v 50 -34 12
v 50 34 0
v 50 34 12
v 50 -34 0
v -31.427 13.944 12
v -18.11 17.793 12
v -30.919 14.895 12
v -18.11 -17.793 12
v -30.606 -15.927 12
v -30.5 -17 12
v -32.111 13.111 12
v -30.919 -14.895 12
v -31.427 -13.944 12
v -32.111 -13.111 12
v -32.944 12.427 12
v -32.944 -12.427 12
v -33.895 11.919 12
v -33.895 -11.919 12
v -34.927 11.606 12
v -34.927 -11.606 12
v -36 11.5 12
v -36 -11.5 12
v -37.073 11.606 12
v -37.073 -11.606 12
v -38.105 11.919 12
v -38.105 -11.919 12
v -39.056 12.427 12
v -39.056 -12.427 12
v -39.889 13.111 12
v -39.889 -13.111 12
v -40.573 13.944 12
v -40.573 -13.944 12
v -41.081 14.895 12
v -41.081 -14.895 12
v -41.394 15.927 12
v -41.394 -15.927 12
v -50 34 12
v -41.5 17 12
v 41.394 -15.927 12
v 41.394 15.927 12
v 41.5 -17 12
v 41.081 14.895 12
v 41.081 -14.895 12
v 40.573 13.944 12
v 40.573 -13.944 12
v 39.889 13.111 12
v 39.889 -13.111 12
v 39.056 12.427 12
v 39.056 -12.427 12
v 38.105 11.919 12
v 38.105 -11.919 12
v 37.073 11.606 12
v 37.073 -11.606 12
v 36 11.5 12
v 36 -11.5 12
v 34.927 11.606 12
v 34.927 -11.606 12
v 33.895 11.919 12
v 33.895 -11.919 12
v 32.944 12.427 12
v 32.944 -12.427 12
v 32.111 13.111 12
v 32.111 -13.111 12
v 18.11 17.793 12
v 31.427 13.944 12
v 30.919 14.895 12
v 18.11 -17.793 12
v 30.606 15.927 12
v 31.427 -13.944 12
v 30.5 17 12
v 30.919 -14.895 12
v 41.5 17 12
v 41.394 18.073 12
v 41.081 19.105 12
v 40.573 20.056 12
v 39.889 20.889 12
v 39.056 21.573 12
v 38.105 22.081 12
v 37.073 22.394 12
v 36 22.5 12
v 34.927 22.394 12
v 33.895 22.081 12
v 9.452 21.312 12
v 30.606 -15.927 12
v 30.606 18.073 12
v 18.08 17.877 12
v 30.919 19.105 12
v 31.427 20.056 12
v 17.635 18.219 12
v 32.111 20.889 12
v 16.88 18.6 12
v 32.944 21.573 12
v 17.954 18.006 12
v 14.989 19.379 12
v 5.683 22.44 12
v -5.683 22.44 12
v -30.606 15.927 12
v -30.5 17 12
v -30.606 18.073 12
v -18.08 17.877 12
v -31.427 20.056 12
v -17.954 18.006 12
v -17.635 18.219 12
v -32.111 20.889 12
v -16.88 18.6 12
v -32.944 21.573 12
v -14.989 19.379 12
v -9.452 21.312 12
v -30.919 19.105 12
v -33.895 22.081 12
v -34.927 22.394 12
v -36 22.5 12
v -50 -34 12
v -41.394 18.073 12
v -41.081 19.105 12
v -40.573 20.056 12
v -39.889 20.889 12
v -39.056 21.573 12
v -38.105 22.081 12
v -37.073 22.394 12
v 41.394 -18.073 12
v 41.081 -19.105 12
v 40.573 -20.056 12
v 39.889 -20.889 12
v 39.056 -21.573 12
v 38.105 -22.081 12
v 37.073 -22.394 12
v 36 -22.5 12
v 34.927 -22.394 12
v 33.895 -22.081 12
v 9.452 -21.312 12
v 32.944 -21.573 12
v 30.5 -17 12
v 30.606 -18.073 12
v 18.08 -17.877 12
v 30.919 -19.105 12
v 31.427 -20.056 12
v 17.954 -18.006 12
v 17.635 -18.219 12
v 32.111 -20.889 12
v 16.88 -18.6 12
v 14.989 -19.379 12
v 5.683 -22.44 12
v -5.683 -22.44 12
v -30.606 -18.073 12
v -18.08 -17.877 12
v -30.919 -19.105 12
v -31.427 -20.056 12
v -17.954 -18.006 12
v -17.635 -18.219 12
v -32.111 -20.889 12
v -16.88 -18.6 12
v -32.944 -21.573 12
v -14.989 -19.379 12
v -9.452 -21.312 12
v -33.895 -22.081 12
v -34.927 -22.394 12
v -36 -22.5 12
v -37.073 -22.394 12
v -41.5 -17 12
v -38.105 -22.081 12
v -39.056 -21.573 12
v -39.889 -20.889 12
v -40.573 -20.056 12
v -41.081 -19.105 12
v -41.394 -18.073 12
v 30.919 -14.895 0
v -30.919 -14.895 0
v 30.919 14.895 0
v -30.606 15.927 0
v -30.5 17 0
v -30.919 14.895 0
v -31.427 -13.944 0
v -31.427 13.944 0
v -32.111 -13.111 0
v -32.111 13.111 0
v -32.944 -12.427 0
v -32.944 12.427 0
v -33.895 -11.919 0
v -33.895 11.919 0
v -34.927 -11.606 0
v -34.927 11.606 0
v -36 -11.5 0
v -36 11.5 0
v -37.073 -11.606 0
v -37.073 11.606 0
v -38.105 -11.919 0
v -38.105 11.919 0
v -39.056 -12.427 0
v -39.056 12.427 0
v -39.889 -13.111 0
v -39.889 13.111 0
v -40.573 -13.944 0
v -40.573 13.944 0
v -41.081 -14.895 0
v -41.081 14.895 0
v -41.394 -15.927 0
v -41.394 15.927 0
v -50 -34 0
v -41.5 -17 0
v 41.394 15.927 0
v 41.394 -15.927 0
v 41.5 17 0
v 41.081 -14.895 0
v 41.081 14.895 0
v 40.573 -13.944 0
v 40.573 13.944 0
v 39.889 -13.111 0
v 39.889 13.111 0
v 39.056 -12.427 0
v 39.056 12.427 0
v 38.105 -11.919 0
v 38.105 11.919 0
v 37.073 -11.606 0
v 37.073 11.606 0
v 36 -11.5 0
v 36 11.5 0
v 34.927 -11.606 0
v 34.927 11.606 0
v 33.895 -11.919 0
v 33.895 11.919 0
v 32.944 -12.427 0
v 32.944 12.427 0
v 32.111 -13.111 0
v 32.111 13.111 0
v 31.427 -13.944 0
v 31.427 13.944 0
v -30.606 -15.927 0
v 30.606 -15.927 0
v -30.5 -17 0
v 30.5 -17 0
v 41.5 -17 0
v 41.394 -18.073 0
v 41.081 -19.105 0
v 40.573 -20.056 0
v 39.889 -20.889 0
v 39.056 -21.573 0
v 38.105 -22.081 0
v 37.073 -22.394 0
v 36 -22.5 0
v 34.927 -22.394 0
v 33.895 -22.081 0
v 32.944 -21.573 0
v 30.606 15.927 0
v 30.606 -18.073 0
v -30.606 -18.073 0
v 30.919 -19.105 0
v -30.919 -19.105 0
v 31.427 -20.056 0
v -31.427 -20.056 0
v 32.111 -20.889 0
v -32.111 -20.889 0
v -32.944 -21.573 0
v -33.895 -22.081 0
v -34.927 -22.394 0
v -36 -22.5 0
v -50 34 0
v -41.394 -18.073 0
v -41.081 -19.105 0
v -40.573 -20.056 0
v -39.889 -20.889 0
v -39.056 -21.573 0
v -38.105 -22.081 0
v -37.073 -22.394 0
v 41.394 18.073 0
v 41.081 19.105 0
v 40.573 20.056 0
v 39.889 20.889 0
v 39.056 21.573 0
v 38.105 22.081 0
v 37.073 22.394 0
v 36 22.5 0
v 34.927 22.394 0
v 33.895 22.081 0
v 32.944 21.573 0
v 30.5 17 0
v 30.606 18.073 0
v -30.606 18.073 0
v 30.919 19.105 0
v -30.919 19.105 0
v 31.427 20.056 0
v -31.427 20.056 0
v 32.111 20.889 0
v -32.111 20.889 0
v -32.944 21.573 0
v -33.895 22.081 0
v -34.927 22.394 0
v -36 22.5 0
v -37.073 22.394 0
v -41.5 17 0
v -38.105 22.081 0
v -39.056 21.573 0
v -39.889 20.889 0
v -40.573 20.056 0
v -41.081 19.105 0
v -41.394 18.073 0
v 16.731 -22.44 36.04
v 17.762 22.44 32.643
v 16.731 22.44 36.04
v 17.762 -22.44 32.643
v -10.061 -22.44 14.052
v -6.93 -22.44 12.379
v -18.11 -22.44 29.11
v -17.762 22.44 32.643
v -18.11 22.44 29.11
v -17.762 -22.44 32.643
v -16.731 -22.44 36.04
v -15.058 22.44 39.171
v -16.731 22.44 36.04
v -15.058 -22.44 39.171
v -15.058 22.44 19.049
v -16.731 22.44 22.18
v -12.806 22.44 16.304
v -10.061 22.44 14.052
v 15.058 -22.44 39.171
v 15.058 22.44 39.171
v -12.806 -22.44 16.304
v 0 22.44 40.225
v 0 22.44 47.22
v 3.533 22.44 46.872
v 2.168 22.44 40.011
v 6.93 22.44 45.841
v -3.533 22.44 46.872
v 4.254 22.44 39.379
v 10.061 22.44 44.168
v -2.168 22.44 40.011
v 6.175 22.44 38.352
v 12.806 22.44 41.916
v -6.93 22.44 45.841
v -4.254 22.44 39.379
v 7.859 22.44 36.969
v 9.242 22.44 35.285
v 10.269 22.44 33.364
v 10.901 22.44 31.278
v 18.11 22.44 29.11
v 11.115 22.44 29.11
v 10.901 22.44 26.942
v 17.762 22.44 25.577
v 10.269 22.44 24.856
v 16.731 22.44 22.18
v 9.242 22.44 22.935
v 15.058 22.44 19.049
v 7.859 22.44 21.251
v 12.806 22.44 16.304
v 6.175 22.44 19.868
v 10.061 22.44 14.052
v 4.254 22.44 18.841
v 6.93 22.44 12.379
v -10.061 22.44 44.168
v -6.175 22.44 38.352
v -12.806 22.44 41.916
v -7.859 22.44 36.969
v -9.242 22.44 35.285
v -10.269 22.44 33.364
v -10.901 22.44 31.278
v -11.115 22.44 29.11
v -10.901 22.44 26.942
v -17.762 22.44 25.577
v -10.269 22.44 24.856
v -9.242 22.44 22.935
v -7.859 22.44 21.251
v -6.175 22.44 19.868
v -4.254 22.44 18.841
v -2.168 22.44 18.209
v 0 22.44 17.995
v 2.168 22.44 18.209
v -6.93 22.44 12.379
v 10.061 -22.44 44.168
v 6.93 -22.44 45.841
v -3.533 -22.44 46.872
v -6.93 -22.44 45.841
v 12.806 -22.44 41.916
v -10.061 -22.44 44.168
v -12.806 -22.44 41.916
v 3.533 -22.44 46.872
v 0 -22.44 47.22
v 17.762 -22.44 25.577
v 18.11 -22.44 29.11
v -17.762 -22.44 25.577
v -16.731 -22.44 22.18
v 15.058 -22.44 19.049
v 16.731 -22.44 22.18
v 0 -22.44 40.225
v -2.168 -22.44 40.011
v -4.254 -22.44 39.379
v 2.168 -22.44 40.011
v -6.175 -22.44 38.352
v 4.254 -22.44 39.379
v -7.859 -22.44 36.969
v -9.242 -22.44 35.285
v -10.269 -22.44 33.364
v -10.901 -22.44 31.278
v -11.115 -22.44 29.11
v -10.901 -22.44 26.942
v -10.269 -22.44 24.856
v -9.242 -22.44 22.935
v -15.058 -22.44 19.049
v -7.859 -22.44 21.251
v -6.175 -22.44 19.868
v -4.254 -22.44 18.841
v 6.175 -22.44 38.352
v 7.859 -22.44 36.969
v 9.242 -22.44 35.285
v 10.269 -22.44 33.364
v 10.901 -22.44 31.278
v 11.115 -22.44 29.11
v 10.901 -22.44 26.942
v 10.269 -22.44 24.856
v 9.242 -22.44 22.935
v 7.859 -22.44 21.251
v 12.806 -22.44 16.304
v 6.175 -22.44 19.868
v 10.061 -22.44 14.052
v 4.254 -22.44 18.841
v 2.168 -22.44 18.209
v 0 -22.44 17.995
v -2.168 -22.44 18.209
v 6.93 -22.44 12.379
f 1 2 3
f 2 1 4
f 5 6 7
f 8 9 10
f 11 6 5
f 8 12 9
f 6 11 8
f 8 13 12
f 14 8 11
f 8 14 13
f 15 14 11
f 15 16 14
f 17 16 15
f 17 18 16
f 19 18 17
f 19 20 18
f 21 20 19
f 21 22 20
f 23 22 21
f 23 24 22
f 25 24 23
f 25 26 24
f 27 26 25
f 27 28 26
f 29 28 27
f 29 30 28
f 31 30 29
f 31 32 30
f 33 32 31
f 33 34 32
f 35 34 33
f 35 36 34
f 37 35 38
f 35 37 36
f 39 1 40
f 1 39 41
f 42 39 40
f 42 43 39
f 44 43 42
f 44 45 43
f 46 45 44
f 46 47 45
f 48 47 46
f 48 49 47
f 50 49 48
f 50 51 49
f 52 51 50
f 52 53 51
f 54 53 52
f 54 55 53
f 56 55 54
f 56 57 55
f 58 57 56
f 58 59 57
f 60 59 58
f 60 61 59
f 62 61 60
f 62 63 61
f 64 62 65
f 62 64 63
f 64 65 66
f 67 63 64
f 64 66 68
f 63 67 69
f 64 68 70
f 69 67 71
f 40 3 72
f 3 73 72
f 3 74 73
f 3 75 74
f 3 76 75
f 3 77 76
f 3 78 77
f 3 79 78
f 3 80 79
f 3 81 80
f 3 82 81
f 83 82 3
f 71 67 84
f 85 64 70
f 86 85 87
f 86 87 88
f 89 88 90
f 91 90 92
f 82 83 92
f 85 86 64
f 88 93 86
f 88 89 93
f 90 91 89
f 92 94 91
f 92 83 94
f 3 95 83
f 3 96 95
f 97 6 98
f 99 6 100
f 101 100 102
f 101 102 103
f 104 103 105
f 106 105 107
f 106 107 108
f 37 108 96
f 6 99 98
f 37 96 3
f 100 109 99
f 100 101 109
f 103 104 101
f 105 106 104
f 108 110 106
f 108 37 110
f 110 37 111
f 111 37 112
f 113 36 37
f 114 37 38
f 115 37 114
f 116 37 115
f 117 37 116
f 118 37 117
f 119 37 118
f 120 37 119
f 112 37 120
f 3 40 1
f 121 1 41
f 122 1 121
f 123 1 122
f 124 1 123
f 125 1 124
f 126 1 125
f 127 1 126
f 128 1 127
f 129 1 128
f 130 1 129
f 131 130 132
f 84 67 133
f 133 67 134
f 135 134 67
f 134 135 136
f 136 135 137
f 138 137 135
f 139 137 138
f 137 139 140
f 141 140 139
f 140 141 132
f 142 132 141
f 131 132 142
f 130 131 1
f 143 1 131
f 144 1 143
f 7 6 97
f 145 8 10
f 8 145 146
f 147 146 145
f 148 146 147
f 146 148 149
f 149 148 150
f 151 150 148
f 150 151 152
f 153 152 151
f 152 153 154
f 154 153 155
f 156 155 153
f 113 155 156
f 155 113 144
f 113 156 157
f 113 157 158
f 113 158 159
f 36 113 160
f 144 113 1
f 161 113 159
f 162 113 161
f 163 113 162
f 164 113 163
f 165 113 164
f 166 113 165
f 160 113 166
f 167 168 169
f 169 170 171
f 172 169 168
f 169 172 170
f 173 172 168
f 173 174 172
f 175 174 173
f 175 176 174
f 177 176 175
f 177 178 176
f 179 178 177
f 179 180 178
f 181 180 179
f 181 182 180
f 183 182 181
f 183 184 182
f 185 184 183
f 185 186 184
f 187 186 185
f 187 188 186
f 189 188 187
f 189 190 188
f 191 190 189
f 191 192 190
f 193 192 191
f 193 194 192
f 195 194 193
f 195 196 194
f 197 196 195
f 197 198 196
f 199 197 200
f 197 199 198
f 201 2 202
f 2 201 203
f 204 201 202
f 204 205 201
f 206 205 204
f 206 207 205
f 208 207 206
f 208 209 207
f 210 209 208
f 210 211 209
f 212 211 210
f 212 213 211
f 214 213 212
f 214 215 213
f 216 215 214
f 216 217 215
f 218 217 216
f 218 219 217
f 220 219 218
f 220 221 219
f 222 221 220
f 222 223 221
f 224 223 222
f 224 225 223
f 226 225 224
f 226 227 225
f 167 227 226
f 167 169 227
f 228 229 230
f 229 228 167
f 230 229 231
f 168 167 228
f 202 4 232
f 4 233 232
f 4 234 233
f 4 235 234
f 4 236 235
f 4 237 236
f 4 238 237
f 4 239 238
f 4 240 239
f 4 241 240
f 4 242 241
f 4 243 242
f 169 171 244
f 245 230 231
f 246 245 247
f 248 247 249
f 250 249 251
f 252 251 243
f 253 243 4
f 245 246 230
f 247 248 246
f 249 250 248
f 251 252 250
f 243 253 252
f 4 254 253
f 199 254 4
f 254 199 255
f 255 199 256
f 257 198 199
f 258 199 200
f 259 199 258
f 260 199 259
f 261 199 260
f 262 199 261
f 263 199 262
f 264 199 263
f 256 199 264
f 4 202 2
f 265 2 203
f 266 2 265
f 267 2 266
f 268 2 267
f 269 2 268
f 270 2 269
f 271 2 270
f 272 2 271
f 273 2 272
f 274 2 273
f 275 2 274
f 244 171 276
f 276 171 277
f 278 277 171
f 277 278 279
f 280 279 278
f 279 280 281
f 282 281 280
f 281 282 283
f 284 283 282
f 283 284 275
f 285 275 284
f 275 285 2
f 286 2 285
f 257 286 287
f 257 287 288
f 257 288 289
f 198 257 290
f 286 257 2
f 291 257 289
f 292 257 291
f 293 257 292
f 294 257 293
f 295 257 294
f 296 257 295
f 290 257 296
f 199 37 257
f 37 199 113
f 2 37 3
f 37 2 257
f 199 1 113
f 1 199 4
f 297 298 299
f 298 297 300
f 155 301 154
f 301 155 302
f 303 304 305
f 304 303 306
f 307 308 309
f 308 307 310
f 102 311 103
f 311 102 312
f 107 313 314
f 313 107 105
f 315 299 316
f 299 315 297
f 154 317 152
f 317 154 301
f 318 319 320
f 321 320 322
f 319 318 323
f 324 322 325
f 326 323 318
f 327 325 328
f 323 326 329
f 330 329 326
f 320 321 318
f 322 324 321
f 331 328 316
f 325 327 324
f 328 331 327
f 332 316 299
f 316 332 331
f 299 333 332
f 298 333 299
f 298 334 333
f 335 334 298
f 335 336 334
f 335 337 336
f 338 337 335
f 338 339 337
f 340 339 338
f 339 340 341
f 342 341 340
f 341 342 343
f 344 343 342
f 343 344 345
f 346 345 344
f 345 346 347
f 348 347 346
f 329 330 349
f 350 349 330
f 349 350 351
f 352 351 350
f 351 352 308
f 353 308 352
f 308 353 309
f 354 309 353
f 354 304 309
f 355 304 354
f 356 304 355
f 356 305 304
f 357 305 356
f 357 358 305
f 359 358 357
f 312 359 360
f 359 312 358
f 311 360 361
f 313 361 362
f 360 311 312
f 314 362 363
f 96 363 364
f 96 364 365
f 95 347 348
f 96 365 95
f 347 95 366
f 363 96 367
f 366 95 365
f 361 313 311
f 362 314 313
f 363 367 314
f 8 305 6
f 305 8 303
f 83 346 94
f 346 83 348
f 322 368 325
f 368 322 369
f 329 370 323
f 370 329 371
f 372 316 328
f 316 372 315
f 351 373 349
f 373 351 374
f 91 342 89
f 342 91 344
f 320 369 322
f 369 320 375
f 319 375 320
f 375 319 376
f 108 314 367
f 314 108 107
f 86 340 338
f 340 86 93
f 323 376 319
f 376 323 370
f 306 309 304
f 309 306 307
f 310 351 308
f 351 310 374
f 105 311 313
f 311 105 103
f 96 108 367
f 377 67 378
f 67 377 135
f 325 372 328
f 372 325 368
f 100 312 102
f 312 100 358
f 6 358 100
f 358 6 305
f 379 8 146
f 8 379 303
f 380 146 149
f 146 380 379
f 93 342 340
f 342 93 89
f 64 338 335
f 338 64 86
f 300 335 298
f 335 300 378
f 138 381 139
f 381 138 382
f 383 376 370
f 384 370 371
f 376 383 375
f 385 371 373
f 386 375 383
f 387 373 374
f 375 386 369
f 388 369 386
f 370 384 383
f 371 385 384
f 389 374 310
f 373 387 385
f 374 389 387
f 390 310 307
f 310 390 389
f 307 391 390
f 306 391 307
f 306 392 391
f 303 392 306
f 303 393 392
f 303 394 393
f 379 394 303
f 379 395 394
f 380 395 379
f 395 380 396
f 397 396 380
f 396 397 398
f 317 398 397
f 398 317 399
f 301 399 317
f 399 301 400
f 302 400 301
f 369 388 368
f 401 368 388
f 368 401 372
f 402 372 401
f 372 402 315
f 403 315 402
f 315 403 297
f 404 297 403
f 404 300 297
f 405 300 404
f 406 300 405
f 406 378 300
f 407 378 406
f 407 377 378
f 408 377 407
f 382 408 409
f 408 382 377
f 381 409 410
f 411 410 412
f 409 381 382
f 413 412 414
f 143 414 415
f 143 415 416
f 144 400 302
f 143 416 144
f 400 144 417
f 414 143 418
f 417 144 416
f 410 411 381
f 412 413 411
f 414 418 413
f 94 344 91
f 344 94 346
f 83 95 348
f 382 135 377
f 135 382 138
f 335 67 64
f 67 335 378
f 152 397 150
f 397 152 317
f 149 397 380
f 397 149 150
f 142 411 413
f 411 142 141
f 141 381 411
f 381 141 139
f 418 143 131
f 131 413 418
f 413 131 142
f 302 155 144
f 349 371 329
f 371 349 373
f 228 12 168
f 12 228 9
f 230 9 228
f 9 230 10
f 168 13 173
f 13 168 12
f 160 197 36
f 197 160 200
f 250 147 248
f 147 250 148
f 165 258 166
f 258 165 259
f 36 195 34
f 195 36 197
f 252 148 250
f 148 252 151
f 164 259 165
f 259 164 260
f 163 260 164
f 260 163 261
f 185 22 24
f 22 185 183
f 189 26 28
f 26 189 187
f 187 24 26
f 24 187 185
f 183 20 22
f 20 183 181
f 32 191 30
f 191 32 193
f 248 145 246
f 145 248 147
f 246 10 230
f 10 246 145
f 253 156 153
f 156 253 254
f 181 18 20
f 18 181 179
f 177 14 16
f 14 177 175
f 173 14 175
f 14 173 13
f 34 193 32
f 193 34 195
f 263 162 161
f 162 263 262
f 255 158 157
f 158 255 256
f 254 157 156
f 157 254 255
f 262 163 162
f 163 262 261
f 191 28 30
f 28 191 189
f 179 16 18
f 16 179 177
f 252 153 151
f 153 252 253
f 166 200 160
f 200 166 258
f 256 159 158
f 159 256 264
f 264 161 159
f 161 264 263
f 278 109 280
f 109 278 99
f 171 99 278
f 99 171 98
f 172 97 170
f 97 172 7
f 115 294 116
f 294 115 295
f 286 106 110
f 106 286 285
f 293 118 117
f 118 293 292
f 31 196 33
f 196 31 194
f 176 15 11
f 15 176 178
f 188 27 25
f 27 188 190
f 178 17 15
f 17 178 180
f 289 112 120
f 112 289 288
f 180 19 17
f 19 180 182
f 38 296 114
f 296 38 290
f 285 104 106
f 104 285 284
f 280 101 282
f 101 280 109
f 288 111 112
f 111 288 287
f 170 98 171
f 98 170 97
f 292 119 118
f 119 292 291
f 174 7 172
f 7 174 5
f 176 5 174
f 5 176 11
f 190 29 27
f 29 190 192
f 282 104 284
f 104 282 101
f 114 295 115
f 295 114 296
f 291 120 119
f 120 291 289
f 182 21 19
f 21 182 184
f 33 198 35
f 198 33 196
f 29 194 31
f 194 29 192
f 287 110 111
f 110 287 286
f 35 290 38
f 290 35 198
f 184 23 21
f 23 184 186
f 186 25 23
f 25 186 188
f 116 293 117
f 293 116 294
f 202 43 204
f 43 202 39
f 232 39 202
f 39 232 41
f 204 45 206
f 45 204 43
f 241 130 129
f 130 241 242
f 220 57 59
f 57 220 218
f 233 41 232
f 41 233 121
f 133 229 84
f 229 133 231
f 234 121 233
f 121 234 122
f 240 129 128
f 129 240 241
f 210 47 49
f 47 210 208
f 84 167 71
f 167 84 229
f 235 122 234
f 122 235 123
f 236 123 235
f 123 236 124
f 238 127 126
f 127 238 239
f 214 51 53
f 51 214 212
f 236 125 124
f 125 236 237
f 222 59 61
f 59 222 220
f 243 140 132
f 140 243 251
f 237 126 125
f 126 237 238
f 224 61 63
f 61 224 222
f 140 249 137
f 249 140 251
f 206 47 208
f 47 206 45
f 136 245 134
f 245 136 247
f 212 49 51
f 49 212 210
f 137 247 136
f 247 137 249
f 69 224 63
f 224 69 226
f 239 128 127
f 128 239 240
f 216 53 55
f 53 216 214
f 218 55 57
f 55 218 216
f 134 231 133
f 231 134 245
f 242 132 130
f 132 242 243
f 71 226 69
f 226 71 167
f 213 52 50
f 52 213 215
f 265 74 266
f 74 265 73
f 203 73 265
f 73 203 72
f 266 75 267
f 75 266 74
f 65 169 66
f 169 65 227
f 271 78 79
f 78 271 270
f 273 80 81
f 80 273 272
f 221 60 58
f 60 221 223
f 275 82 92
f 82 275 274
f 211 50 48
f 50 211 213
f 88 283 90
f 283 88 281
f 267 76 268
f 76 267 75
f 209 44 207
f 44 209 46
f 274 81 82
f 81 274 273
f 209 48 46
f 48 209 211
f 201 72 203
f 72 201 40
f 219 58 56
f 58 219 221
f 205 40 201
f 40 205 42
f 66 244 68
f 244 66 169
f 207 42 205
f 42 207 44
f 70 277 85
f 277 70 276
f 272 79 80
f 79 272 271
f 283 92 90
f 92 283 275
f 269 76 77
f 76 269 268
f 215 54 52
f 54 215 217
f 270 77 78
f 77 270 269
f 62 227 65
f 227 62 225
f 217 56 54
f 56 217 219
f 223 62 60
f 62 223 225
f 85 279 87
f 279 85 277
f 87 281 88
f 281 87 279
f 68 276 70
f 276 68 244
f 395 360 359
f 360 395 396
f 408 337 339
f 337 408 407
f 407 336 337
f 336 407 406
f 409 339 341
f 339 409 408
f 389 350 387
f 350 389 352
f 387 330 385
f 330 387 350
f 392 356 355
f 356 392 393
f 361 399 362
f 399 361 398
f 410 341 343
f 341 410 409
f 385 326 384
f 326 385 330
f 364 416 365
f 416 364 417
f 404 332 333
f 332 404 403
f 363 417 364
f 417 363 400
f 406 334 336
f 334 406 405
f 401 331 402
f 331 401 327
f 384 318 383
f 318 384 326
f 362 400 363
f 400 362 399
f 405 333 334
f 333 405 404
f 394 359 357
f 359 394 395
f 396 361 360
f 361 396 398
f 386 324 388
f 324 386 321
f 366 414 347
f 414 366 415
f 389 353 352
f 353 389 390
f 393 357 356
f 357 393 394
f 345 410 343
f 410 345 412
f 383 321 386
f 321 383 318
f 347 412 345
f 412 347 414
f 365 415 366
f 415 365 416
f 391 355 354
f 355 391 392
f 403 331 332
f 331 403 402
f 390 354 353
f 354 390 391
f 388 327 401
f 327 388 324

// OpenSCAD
$fn = 32;

// ----------------------------------------------------------------------
// Bearing block: 100 x 68 mm base, 22.23 mm bore at 29.11 mm
// ----------------------------------------------------------------------

// --- parameters (mm) ---
base_w = 100;             // base width
base_d = 68;              // base depth
base_t = 12;              // base thickness
bore_d = 22.23;           // shaft / bearing bore
house_r = 18.11;          // housing outer radius
house_len = 44.88;        // housing length along the shaft
foot_w = 36.22;           // foot width under the housing
foot_len = 34.88;         // foot length along the shaft
axis_z = 29.11;           // bore axis height above the base
holes_d = 11;             // mounting holes
hole_x = 36;              // mounting hole spacing

difference() {
  union() {
    /* base plate with its underside on z = 0 */
    translate([0, 0, base_t / 2]) cube([base_w, base_d, base_t], center = true);
    /* hull foot: a straight web blending into the round housing */
    hull() {
      translate([0, 0, base_t - 0.5]) cube([foot_w, foot_len, 1.6], center = true);
      translate([0, 0, axis_z]) rotate([-90, 0, 0]) cylinder(h = house_len, d = 2 * house_r, center = true);
    }
  }
  /* bore through the housing, 2.5 mm clear on both sides */
  translate([0, 0, axis_z]) rotate([-90, 0, 0]) cylinder(h = house_len + 5, d = bore_d, center = true);
  /* mounting holes through the base plate */
  for (hx = [-36, 36]) {
    for (hy = [-17, 17]) {
      translate([hx, hy, -2.5]) cylinder(h = base_t + 5, d = holes_d);
    }
  }
}
